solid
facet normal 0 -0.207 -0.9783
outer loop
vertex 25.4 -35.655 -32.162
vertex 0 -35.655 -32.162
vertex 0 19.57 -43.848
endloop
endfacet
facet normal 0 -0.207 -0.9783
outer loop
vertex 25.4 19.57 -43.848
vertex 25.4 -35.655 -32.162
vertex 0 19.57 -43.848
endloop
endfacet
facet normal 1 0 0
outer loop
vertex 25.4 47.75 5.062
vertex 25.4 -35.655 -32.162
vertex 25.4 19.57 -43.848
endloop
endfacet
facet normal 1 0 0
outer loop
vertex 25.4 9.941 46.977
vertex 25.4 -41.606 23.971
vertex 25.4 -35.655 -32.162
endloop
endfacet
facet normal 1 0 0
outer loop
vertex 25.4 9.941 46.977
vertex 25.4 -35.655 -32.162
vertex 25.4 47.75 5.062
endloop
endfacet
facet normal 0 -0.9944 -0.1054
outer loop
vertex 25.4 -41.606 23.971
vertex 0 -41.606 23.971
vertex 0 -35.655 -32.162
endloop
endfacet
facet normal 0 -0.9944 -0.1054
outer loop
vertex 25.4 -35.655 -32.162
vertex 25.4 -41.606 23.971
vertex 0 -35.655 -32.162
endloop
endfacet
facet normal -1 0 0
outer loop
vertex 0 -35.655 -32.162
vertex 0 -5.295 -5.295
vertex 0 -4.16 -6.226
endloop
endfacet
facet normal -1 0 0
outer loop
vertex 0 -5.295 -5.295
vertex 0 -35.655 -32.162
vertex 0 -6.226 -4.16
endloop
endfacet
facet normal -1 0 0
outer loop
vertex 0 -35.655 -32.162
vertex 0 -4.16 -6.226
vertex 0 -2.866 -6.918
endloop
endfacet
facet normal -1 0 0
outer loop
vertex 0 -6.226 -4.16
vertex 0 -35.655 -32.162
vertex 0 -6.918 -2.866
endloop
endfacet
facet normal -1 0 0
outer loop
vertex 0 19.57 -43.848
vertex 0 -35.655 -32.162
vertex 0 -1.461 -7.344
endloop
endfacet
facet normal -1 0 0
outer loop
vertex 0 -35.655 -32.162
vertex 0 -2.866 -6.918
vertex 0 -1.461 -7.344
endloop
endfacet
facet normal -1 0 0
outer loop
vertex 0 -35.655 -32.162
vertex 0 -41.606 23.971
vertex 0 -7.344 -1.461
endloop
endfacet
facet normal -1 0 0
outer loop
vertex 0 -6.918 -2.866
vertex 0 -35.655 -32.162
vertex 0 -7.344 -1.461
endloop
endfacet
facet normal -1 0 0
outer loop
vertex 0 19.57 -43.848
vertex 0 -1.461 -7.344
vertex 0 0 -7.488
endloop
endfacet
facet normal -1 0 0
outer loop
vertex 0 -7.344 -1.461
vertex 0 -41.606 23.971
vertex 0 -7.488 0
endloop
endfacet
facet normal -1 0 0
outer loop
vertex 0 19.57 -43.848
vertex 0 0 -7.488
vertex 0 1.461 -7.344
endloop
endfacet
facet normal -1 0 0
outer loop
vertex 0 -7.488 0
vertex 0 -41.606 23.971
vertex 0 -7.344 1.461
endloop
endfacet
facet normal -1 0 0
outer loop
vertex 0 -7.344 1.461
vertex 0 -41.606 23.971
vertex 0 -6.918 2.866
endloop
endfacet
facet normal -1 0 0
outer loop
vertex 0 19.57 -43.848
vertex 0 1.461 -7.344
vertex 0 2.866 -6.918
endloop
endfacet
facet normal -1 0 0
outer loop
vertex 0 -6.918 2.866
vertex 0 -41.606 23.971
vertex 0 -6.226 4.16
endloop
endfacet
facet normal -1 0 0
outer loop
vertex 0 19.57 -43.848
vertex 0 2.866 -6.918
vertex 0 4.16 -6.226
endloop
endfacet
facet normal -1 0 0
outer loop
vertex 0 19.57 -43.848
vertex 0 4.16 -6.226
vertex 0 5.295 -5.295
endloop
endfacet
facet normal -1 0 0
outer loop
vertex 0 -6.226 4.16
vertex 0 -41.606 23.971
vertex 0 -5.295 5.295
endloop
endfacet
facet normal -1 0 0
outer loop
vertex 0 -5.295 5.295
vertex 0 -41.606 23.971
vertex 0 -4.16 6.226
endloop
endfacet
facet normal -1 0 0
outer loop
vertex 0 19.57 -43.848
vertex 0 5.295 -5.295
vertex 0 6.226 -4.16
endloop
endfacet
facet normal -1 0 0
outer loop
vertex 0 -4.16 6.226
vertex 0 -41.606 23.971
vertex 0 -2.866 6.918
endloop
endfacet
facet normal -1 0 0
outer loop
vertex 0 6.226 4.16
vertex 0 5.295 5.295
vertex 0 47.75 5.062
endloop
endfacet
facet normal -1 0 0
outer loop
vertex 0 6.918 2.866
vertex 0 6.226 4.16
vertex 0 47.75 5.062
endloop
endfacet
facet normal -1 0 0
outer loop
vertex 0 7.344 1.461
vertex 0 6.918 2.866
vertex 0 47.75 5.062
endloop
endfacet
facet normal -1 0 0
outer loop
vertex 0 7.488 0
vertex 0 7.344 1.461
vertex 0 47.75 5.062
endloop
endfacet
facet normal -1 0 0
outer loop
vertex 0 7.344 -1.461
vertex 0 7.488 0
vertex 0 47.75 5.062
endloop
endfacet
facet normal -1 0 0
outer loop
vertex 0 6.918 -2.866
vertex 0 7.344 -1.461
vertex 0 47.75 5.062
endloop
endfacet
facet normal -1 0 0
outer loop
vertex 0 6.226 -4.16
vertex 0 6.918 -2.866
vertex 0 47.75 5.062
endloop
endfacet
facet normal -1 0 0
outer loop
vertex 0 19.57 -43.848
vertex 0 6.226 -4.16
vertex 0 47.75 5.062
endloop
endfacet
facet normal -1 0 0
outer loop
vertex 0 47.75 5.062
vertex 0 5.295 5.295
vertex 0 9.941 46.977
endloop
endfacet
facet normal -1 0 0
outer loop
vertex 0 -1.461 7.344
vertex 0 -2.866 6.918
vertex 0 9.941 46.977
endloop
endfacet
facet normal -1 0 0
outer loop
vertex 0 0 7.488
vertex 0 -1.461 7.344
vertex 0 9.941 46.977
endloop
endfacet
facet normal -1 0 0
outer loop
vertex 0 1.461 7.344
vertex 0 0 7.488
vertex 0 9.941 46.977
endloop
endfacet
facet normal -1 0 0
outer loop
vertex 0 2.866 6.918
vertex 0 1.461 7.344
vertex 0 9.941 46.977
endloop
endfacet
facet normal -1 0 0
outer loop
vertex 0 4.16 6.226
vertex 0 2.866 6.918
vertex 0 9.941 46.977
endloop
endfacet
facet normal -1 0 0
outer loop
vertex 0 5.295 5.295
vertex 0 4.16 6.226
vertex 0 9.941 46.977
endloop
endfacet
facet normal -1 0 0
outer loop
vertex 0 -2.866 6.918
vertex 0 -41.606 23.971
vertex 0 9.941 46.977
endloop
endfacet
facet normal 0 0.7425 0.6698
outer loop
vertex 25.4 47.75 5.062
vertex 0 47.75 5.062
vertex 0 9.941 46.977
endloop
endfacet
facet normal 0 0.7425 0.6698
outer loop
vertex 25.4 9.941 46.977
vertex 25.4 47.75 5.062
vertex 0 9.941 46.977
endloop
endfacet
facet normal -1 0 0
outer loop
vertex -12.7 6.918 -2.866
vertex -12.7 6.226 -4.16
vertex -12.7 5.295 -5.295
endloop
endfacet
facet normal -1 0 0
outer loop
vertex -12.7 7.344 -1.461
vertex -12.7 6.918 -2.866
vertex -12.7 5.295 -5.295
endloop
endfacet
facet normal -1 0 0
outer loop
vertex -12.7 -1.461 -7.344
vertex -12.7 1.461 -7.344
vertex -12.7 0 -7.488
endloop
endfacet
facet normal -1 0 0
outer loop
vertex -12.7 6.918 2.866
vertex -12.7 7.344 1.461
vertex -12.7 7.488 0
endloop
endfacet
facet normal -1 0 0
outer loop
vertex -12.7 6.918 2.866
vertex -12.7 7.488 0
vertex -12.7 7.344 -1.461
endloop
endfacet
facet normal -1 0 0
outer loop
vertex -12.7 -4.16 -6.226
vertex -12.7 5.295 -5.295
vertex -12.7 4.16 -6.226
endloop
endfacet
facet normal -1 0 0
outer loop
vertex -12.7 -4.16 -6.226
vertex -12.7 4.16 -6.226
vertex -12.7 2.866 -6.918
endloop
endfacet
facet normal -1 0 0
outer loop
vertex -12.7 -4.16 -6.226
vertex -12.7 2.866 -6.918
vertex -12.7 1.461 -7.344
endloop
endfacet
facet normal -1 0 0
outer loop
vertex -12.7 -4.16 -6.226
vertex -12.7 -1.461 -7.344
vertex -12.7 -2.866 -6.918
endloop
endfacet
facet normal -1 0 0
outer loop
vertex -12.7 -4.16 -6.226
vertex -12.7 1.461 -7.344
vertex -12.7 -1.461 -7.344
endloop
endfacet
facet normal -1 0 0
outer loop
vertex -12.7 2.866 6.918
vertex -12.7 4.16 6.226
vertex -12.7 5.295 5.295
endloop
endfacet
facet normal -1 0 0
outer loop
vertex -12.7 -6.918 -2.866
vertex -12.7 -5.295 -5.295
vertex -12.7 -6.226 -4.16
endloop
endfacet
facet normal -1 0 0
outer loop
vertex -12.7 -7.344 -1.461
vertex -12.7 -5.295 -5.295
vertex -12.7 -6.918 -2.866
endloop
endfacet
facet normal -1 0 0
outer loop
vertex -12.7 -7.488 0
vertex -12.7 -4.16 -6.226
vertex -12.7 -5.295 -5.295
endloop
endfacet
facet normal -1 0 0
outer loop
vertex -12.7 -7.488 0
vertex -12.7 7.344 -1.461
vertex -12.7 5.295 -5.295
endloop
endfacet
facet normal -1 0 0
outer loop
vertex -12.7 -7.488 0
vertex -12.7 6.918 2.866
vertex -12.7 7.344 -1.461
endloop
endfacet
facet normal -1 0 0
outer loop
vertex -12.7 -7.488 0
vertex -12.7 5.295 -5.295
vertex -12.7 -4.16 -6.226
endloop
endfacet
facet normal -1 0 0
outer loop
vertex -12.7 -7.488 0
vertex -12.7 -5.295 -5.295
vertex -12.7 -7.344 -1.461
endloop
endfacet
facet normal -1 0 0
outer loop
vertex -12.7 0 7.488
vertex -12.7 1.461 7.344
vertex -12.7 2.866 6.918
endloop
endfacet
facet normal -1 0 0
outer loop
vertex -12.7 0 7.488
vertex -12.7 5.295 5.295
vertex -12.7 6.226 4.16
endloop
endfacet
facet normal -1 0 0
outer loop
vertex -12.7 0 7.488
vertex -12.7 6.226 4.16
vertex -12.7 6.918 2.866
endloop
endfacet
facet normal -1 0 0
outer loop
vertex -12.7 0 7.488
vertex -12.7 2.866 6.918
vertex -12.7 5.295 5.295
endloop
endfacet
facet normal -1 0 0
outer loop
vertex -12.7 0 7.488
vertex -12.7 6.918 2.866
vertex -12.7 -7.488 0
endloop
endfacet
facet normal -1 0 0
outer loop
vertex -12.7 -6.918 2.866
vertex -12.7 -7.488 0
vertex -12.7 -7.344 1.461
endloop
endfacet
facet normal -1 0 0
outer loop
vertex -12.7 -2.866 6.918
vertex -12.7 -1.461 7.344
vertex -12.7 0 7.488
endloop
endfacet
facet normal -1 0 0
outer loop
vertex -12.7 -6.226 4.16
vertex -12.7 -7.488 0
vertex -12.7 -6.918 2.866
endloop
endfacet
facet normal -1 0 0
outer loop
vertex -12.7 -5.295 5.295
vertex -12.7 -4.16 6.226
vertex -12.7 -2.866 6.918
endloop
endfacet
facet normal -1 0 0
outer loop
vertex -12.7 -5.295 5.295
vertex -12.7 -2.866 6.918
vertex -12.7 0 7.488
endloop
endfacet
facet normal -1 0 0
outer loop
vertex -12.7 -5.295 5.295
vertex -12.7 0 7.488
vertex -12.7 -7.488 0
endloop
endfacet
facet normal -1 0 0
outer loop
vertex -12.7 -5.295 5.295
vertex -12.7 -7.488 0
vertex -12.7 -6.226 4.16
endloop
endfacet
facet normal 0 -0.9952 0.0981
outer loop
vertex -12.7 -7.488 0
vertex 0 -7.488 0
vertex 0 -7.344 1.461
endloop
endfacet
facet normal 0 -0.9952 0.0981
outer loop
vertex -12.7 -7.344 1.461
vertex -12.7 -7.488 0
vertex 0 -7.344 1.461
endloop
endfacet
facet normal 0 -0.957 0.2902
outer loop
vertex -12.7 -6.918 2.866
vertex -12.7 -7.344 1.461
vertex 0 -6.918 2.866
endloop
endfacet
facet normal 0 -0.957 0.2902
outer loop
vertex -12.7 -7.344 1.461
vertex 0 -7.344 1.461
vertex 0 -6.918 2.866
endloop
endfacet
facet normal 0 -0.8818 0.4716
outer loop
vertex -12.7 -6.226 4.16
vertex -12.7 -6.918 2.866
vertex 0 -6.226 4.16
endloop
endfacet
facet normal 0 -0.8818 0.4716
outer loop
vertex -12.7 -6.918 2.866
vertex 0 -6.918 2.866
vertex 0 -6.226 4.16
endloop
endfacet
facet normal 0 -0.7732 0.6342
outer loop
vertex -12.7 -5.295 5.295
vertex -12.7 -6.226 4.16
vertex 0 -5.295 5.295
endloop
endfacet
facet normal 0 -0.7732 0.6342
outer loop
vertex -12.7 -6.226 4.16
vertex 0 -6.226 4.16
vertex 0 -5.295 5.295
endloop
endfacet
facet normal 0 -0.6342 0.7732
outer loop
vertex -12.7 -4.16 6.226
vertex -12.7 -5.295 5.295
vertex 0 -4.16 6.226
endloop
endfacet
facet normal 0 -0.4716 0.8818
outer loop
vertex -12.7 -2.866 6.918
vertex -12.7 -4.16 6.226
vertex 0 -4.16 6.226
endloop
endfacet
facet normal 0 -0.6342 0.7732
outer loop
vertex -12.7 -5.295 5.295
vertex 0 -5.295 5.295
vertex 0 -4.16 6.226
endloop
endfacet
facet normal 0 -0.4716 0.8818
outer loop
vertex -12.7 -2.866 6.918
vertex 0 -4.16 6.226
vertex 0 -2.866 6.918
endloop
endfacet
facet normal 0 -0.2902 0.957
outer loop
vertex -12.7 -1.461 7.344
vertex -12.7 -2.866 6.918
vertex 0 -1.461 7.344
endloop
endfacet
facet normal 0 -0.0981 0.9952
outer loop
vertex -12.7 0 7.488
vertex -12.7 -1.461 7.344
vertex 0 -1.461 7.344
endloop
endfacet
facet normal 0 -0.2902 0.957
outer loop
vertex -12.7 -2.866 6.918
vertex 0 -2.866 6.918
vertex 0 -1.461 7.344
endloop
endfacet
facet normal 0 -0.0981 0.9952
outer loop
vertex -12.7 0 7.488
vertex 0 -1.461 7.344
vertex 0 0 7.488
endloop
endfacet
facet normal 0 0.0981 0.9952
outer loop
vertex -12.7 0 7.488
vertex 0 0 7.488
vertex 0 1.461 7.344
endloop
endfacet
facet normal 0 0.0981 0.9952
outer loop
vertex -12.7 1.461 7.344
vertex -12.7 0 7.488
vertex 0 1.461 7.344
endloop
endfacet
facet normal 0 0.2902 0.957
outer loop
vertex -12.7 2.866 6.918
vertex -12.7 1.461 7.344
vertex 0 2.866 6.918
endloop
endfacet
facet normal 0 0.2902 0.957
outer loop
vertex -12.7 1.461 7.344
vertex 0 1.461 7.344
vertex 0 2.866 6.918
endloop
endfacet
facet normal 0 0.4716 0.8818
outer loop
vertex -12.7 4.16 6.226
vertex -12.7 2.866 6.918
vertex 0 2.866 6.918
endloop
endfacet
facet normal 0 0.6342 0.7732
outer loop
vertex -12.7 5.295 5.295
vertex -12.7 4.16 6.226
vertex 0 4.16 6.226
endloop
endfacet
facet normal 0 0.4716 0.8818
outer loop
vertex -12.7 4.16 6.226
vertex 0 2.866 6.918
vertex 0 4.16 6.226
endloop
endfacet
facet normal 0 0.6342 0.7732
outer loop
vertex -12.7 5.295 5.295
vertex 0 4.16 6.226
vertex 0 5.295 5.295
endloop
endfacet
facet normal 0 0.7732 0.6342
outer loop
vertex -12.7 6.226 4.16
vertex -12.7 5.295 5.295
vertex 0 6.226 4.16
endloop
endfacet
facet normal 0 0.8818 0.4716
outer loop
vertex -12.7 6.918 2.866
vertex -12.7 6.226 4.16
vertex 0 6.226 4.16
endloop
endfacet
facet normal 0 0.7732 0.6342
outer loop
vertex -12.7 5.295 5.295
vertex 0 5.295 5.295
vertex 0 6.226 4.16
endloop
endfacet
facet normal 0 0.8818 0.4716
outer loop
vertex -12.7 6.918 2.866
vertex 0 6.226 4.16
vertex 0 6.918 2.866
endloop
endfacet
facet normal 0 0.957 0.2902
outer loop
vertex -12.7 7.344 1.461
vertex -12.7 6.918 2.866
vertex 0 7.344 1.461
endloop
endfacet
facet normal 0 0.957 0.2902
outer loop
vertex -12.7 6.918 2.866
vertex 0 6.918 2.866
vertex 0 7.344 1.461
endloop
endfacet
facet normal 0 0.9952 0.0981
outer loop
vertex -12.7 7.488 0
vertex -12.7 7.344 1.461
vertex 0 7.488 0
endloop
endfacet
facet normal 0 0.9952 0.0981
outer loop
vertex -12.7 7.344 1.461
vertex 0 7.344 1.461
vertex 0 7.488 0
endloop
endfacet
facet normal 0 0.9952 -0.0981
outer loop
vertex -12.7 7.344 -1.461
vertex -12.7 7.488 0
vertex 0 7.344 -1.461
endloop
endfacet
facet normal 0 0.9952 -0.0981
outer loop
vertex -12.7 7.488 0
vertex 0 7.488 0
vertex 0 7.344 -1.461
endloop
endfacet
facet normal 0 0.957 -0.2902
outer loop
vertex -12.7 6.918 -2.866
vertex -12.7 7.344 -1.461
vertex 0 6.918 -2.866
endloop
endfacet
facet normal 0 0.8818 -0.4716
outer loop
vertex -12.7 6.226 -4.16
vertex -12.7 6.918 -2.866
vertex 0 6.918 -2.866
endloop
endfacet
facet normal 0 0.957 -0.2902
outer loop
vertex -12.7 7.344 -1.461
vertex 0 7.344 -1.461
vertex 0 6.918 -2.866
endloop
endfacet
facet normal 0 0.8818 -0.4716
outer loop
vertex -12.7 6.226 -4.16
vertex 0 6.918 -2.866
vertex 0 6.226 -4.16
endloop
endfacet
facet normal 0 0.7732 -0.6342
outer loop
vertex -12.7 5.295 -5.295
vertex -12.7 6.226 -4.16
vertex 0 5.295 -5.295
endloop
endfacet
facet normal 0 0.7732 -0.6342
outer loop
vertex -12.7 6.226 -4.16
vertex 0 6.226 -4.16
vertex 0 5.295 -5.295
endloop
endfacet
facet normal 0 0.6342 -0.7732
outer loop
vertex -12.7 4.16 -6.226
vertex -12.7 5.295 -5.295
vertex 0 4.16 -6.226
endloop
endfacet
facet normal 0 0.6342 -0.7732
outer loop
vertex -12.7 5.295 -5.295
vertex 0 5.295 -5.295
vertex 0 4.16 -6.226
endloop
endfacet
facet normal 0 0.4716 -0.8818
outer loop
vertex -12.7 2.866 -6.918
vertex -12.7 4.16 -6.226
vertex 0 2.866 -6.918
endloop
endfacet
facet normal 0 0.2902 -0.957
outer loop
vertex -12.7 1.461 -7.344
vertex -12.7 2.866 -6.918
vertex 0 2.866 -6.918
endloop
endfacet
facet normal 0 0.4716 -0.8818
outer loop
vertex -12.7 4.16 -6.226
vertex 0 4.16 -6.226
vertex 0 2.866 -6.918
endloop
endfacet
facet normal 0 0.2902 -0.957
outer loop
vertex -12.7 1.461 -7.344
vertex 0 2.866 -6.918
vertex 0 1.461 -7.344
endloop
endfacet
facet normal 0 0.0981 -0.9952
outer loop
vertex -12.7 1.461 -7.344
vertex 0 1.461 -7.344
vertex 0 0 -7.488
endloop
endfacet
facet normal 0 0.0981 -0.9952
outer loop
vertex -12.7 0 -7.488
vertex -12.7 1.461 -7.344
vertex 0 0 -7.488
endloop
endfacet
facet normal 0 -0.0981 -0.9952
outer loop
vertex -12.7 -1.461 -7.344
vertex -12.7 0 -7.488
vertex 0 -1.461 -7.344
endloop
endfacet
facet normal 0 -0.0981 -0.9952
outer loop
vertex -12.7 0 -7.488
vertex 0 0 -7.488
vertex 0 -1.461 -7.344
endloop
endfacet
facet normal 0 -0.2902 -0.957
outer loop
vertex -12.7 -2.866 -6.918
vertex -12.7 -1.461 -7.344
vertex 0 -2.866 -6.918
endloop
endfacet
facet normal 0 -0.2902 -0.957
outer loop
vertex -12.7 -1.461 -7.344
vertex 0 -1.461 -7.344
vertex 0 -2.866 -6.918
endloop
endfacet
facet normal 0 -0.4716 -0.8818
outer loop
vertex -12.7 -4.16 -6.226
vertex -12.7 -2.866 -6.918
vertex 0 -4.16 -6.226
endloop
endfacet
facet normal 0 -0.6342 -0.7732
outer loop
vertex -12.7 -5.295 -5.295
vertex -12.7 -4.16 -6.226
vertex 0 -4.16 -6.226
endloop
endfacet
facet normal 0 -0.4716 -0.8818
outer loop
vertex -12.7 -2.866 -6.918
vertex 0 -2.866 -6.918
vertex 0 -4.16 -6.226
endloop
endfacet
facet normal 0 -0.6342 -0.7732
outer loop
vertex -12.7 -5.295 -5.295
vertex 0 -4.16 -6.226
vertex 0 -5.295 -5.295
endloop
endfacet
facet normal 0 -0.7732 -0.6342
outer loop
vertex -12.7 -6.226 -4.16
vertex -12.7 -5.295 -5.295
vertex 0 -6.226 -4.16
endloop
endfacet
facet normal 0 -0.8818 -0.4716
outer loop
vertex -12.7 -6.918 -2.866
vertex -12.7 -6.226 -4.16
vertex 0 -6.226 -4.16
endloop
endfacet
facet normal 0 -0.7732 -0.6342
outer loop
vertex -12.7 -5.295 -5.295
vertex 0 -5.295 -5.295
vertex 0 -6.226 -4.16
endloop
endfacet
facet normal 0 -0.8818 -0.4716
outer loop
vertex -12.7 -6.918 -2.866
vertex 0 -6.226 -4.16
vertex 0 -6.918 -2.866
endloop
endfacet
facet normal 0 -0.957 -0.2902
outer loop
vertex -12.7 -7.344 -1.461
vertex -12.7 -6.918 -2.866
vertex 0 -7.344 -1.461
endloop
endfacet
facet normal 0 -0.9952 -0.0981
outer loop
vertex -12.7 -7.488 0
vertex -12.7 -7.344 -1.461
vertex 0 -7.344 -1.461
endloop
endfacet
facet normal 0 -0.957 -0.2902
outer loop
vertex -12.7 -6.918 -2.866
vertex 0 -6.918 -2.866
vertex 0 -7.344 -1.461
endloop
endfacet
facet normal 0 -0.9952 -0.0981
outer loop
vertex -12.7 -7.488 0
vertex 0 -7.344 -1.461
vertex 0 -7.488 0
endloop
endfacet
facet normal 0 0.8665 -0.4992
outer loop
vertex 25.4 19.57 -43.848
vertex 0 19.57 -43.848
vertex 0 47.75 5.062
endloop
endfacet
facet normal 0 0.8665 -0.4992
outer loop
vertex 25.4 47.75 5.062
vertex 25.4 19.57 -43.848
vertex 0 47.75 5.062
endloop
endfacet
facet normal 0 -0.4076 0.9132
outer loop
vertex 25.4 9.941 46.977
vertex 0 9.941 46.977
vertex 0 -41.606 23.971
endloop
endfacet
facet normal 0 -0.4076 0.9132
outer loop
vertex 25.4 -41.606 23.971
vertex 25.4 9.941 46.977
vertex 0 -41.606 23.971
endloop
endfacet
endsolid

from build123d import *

# Parameters (mm, degrees)
F1_DEPTH = 25.4
F2_R     = 7.488369
F3_DEPTH = 12.7


with BuildPart() as f1:
    # F0 (on Right) → F1 (new body)
    with BuildSketch(Plane.YZ):
        Polygon((19.569545, -43.848365), (47.749595, 5.061853), (9.941328, 46.976762), (-41.605517, 23.971383), (-35.654951, -32.161633), align=None)
    extrude(amount=F1_DEPTH)

    # F2 (on face) → F3 (join)
    with BuildSketch(Plane(origin=(0, 0, 0), x_dir=(0, -1, 0), z_dir=(-1, 0, 0))):
        Circle(F2_R)
    extrude(amount=F3_DEPTH)


solid = f1.part
